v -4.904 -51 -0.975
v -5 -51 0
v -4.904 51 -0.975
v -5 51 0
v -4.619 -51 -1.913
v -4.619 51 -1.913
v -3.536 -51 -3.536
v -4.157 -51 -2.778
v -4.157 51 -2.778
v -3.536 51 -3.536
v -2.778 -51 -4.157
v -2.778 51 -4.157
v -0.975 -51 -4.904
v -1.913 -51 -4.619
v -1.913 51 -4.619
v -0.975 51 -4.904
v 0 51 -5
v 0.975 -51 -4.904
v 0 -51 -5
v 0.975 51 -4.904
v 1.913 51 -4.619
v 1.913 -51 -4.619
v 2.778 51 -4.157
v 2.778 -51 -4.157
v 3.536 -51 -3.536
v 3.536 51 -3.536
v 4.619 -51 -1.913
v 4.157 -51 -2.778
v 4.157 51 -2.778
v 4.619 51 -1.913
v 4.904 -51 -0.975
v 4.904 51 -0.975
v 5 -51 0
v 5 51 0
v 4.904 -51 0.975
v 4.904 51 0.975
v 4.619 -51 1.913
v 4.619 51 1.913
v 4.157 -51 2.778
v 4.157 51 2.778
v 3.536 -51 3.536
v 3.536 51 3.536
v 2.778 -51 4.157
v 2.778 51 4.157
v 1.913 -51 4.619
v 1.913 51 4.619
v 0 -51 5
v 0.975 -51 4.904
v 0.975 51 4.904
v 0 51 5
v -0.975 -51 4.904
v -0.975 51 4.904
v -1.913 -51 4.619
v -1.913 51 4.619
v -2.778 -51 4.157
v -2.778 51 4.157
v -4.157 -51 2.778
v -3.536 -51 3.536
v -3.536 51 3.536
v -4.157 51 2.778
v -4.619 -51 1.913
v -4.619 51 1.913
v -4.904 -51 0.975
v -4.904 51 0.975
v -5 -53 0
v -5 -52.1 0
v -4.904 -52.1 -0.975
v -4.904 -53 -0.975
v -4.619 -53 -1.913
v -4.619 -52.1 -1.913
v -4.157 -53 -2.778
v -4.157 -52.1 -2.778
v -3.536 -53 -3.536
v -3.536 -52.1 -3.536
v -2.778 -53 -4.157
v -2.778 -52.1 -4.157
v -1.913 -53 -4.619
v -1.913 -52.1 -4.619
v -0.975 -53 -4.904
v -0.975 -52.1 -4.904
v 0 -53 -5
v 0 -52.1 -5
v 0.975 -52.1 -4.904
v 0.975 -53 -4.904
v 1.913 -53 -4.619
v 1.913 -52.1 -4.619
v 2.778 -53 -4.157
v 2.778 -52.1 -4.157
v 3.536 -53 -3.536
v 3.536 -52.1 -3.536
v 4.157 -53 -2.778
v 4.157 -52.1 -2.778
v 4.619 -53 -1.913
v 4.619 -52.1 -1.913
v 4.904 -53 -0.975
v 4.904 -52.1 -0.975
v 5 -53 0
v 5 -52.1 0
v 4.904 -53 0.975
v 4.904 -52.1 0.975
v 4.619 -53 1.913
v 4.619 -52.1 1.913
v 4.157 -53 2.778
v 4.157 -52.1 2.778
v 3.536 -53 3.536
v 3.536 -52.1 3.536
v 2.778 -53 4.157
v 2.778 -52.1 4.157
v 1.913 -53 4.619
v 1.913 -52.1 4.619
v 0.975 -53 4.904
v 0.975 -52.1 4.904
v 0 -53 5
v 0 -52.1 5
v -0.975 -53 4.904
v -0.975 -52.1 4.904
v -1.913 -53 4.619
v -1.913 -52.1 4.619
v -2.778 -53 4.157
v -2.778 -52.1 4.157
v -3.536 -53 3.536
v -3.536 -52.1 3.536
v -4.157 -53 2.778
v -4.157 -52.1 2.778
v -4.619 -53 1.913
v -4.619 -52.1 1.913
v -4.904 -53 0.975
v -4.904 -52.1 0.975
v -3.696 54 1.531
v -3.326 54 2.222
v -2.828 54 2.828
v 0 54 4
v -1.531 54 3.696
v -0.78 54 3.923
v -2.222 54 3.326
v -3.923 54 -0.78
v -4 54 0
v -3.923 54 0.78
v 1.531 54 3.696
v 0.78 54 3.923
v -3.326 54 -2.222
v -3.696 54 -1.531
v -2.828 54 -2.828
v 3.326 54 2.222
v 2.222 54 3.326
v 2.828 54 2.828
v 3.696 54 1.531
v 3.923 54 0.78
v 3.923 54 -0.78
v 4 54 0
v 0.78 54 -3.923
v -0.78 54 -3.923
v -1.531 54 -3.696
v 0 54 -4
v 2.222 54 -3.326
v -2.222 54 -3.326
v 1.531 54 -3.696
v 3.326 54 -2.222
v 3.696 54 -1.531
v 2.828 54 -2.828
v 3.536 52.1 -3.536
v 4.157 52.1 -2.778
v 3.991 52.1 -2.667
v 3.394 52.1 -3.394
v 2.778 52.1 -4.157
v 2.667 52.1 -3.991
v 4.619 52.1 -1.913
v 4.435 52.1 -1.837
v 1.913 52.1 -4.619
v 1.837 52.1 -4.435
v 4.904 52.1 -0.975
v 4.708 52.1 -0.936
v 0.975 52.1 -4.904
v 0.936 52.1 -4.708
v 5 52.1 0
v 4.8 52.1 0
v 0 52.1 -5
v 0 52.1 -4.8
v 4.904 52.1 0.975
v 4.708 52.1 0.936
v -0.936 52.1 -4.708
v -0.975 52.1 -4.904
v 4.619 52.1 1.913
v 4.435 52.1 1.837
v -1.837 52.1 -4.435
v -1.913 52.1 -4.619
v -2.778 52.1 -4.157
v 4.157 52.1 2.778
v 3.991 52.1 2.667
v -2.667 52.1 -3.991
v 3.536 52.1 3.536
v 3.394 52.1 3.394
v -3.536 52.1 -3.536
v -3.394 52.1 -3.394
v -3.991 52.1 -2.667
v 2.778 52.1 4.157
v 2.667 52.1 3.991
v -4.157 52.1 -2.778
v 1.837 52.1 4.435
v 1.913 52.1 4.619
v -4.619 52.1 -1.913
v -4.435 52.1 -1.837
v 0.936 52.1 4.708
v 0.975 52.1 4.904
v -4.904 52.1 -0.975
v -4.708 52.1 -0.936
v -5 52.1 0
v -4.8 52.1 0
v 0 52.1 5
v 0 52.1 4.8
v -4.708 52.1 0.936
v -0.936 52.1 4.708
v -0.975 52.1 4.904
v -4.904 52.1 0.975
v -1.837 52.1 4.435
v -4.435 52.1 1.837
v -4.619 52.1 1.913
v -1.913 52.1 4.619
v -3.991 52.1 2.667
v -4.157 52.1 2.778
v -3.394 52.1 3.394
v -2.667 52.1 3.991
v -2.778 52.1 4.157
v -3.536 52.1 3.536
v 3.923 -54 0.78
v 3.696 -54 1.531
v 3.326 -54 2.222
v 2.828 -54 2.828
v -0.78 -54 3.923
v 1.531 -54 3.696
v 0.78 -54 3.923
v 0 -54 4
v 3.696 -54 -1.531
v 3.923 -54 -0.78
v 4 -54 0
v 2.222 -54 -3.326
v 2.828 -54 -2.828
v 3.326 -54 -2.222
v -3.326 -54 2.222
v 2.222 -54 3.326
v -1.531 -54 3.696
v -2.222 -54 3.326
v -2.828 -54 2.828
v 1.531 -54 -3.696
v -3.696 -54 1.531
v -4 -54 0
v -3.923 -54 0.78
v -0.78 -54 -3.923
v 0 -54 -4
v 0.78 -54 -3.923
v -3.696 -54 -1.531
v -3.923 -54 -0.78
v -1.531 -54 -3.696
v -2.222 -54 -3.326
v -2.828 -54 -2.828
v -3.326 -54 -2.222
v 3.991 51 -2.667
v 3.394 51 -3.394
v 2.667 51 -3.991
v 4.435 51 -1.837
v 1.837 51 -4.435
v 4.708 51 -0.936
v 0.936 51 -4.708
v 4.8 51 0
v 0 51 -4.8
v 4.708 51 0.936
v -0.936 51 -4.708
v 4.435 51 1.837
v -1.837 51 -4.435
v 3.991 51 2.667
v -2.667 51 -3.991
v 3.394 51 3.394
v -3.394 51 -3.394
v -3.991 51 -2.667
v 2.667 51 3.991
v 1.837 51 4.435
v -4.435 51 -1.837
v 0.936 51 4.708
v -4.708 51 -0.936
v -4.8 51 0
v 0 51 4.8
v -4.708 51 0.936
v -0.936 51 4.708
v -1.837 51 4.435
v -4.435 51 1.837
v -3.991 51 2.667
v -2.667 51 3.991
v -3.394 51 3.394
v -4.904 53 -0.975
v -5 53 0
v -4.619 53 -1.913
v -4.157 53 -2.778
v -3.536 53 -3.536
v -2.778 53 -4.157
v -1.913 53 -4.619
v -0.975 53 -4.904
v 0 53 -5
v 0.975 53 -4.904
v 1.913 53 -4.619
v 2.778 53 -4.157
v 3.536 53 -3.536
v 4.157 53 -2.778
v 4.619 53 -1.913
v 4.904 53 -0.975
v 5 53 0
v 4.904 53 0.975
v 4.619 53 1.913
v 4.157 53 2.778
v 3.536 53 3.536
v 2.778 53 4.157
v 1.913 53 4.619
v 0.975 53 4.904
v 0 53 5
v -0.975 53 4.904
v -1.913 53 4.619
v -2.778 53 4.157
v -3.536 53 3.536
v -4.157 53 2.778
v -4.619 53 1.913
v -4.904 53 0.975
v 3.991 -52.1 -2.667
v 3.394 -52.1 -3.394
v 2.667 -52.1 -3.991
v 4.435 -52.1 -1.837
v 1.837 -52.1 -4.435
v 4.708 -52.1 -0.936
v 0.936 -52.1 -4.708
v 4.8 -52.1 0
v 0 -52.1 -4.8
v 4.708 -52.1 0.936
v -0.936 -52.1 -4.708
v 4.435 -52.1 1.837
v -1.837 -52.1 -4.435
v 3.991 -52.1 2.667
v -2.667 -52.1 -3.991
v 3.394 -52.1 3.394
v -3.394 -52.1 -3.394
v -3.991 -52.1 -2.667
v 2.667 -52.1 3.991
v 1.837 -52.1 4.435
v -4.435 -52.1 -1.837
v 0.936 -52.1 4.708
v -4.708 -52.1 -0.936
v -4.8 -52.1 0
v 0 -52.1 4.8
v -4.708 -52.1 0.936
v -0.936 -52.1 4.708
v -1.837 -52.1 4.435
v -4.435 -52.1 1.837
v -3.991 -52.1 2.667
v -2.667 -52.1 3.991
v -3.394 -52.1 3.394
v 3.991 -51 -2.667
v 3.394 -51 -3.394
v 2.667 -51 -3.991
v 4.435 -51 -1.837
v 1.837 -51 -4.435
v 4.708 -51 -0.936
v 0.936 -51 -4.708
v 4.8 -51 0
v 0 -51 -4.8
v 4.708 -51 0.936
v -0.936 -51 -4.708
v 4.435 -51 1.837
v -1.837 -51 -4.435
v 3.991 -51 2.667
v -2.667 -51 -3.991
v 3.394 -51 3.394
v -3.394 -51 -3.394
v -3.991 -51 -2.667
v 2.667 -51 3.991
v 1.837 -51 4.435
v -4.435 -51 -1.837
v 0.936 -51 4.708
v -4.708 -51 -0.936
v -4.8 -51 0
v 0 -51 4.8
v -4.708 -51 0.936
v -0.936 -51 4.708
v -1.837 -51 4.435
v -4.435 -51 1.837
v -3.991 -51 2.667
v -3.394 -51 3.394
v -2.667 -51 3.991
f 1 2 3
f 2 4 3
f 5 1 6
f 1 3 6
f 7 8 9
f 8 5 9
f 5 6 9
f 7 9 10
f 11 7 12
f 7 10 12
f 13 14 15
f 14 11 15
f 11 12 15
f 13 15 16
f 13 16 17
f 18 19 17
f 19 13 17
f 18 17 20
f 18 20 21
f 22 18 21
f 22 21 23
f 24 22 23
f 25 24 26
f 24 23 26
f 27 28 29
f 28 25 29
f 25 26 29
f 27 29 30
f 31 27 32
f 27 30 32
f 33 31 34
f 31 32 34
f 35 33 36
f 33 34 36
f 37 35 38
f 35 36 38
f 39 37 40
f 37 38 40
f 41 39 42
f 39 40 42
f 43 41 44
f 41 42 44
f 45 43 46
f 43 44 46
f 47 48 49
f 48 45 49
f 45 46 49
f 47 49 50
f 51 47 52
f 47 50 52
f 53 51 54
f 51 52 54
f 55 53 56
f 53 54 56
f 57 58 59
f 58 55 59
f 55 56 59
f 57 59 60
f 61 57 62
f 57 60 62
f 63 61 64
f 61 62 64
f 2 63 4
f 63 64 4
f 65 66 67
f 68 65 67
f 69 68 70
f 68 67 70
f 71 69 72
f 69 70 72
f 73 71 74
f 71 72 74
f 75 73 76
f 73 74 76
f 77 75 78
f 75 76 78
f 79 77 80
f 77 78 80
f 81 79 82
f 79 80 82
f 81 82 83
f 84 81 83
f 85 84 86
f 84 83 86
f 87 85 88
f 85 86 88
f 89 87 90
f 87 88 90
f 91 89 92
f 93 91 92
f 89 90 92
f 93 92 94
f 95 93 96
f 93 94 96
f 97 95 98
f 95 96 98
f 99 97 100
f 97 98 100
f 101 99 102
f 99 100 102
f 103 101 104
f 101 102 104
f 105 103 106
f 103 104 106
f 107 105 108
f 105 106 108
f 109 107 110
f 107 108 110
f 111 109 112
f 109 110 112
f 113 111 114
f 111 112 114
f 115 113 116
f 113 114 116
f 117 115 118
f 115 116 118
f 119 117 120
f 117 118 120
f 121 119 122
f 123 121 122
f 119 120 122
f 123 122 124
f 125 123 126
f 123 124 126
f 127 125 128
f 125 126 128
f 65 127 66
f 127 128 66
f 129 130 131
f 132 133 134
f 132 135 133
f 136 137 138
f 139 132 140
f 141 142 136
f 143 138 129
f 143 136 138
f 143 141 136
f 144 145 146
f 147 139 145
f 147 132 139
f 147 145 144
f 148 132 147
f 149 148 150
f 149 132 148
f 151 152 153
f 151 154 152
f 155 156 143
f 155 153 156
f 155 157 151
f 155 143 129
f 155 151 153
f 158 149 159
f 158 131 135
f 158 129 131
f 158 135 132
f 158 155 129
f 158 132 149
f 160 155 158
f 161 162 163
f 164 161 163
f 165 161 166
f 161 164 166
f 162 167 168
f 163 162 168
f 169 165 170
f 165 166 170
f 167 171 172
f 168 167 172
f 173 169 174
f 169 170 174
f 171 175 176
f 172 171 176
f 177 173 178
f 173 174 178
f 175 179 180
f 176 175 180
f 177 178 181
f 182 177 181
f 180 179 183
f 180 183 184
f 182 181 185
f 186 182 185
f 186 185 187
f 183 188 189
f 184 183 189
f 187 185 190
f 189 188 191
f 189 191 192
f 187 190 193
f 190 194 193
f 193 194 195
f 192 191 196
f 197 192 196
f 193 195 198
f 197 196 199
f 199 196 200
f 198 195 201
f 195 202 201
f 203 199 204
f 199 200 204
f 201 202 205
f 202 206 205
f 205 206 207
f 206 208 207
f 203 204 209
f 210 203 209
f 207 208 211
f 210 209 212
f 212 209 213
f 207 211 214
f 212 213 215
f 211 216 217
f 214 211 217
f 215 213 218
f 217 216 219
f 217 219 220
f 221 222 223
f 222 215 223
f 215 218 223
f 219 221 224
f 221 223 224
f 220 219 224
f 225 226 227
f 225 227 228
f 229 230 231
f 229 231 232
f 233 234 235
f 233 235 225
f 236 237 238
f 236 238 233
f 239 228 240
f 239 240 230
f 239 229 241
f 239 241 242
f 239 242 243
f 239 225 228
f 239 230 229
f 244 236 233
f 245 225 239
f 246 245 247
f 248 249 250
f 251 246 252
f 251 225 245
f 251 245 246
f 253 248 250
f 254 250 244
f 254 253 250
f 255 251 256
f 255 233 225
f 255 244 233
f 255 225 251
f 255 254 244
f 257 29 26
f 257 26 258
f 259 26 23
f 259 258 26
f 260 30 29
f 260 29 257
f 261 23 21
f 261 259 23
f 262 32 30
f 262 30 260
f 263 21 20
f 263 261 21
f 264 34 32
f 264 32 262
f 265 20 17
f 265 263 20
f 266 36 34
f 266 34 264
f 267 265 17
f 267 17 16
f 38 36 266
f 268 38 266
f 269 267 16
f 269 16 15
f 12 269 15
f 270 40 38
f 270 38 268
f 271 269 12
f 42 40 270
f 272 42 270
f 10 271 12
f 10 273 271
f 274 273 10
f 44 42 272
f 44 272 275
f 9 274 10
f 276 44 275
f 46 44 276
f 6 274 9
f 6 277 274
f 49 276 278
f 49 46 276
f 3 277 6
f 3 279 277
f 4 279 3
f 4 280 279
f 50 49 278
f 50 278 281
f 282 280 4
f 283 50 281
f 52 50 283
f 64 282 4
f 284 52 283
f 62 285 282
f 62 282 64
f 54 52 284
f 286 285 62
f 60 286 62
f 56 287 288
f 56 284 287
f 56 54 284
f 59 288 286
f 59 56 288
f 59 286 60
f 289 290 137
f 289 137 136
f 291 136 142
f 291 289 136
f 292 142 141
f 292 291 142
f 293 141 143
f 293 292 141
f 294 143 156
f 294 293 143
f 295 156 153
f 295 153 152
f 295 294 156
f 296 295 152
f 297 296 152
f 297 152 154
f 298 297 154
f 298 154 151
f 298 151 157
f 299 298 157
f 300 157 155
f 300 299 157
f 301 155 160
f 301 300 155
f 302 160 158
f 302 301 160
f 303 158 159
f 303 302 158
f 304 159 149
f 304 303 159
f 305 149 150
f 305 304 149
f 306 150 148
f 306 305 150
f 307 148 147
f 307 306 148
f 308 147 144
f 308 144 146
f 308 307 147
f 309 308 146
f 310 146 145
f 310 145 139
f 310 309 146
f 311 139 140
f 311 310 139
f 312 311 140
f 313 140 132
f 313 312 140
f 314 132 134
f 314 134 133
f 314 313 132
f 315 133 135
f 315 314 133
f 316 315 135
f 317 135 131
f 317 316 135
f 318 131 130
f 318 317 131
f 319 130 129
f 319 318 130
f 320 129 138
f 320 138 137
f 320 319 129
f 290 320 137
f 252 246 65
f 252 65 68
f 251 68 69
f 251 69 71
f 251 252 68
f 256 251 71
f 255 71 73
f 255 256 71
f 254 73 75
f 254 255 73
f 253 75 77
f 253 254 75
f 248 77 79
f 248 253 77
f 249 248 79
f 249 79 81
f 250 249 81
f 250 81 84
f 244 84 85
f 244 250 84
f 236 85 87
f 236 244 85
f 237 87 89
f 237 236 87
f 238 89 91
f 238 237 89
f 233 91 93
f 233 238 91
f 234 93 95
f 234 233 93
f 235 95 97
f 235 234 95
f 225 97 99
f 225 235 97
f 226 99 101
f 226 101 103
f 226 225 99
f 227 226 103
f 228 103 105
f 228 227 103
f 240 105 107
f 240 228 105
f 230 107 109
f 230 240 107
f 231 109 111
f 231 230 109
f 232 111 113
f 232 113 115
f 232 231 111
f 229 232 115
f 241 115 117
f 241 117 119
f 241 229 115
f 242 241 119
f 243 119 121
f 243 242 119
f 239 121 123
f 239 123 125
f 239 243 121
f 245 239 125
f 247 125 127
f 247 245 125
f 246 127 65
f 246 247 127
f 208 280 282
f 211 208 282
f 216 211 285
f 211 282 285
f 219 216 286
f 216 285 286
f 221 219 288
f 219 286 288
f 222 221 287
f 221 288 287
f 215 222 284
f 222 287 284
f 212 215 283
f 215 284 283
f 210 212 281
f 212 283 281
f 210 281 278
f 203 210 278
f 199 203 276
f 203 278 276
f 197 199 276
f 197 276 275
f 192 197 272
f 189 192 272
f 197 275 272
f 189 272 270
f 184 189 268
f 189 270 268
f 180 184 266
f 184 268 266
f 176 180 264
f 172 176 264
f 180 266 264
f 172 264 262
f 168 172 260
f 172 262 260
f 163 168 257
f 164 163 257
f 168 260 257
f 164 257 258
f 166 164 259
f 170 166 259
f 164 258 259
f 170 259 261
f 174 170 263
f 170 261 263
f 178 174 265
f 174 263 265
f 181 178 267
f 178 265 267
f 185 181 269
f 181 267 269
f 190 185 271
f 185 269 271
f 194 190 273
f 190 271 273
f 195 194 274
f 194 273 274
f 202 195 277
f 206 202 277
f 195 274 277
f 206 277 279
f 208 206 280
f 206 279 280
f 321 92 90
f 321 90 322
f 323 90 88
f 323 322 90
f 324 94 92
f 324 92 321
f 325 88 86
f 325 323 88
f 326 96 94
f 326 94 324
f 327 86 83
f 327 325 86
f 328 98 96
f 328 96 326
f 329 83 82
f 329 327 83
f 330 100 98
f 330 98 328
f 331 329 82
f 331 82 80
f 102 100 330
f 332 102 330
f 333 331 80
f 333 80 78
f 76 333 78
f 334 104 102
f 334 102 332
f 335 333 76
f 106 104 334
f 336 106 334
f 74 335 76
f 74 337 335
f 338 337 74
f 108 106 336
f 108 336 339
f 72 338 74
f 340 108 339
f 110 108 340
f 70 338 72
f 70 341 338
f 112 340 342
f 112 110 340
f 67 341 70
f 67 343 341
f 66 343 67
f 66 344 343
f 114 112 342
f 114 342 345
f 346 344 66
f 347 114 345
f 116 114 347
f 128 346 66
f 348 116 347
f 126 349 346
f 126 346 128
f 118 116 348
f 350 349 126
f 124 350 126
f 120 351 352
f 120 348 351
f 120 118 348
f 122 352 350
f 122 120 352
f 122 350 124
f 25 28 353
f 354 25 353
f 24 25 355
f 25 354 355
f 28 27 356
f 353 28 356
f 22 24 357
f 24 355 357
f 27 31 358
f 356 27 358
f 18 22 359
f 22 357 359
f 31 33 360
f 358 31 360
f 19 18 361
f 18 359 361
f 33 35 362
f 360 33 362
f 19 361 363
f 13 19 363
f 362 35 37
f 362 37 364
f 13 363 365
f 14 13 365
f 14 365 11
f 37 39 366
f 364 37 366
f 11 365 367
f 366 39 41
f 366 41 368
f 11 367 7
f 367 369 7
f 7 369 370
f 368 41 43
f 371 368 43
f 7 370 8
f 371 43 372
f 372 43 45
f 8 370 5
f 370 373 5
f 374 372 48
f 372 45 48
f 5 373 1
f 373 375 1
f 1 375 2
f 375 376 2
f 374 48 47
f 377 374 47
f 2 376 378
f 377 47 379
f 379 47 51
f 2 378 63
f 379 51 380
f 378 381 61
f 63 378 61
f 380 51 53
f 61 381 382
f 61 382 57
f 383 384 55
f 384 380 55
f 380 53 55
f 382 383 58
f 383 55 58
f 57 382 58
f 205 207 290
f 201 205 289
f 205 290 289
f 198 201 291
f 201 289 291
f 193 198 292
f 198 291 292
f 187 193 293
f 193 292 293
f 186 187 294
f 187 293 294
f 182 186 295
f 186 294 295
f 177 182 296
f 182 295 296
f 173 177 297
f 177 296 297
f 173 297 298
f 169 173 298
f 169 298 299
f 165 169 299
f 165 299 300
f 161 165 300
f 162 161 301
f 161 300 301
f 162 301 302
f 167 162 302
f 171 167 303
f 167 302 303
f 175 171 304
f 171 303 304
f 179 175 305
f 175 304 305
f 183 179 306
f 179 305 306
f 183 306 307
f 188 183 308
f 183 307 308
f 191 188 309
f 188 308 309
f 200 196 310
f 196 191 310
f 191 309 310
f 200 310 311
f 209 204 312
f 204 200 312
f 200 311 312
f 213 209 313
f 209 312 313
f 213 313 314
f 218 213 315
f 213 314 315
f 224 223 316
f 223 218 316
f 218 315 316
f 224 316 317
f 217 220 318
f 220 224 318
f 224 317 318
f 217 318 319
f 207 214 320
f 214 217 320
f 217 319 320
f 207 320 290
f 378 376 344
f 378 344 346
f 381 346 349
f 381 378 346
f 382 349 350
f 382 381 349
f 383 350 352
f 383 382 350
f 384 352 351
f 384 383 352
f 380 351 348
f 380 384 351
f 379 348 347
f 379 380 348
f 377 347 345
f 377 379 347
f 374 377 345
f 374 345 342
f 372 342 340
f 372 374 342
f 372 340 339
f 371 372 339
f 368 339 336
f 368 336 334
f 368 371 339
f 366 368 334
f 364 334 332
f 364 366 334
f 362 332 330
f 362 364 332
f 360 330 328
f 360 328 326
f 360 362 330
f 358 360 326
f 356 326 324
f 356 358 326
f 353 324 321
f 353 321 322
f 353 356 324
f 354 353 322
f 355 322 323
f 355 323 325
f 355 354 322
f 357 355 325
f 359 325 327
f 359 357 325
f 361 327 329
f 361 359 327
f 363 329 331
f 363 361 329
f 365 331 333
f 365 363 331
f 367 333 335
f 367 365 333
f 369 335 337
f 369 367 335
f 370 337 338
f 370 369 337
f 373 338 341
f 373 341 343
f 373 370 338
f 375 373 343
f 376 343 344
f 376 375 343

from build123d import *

# Parameters (mm, degrees)
CHAMFER_1_SIZE      = 1
CUT_EXTRUDE_START   = -3
SKETCH_2_R          = 5
SKETCH_2_R_2        = 4.8
CUT_EXTRUDE_1_DEPTH = 1.1


with BuildPart() as part:
    # 草图1 → 旋转1 (revolve)
    with BuildSketch(Plane.XY, mode=Mode.PRIVATE) as revolve_1_sk:
        Polygon((0, 54), (5, 54), (5, 30), (5, -30), (5, -54), (0, -54), align=None)
    revolve(revolve_1_sk.sketch.rotate(Axis((0, 54, 0), (0, -1, 0)), 180), axis=Axis((0, 54, 0), (0, -1, 0)))

    # 倒角1
    chamfer_1_edges = [part.edges().sort_by_distance(p)[0] for p in [
        (5, -54, 0),
        (5, 54, 0),
    ]]
    chamfer(chamfer_1_edges, length=CHAMFER_1_SIZE)

    # 草图2 → 切除-拉伸1 (cut)
    with BuildSketch(Plane(origin=(0, 54, 0), x_dir=(1, 0, 0), z_dir=(0, 1, 0)).offset(CUT_EXTRUDE_START)):
        with Locations(Location((0, 0, 0), (0, 0, 180))):
            Circle(SKETCH_2_R)
        with Locations(Location((0, 0, 0), (0, 0, 180))):
            Circle(SKETCH_2_R_2, mode=Mode.SUBTRACT)
    cut_extrude_1 = extrude(amount=CUT_EXTRUDE_1_DEPTH, mode=Mode.SUBTRACT)

    # 镜向1: 切除-拉伸1 across plane
    add(cut_extrude_1.mirror(Plane.ZX), mode=Mode.SUBTRACT)


solid = part.part
